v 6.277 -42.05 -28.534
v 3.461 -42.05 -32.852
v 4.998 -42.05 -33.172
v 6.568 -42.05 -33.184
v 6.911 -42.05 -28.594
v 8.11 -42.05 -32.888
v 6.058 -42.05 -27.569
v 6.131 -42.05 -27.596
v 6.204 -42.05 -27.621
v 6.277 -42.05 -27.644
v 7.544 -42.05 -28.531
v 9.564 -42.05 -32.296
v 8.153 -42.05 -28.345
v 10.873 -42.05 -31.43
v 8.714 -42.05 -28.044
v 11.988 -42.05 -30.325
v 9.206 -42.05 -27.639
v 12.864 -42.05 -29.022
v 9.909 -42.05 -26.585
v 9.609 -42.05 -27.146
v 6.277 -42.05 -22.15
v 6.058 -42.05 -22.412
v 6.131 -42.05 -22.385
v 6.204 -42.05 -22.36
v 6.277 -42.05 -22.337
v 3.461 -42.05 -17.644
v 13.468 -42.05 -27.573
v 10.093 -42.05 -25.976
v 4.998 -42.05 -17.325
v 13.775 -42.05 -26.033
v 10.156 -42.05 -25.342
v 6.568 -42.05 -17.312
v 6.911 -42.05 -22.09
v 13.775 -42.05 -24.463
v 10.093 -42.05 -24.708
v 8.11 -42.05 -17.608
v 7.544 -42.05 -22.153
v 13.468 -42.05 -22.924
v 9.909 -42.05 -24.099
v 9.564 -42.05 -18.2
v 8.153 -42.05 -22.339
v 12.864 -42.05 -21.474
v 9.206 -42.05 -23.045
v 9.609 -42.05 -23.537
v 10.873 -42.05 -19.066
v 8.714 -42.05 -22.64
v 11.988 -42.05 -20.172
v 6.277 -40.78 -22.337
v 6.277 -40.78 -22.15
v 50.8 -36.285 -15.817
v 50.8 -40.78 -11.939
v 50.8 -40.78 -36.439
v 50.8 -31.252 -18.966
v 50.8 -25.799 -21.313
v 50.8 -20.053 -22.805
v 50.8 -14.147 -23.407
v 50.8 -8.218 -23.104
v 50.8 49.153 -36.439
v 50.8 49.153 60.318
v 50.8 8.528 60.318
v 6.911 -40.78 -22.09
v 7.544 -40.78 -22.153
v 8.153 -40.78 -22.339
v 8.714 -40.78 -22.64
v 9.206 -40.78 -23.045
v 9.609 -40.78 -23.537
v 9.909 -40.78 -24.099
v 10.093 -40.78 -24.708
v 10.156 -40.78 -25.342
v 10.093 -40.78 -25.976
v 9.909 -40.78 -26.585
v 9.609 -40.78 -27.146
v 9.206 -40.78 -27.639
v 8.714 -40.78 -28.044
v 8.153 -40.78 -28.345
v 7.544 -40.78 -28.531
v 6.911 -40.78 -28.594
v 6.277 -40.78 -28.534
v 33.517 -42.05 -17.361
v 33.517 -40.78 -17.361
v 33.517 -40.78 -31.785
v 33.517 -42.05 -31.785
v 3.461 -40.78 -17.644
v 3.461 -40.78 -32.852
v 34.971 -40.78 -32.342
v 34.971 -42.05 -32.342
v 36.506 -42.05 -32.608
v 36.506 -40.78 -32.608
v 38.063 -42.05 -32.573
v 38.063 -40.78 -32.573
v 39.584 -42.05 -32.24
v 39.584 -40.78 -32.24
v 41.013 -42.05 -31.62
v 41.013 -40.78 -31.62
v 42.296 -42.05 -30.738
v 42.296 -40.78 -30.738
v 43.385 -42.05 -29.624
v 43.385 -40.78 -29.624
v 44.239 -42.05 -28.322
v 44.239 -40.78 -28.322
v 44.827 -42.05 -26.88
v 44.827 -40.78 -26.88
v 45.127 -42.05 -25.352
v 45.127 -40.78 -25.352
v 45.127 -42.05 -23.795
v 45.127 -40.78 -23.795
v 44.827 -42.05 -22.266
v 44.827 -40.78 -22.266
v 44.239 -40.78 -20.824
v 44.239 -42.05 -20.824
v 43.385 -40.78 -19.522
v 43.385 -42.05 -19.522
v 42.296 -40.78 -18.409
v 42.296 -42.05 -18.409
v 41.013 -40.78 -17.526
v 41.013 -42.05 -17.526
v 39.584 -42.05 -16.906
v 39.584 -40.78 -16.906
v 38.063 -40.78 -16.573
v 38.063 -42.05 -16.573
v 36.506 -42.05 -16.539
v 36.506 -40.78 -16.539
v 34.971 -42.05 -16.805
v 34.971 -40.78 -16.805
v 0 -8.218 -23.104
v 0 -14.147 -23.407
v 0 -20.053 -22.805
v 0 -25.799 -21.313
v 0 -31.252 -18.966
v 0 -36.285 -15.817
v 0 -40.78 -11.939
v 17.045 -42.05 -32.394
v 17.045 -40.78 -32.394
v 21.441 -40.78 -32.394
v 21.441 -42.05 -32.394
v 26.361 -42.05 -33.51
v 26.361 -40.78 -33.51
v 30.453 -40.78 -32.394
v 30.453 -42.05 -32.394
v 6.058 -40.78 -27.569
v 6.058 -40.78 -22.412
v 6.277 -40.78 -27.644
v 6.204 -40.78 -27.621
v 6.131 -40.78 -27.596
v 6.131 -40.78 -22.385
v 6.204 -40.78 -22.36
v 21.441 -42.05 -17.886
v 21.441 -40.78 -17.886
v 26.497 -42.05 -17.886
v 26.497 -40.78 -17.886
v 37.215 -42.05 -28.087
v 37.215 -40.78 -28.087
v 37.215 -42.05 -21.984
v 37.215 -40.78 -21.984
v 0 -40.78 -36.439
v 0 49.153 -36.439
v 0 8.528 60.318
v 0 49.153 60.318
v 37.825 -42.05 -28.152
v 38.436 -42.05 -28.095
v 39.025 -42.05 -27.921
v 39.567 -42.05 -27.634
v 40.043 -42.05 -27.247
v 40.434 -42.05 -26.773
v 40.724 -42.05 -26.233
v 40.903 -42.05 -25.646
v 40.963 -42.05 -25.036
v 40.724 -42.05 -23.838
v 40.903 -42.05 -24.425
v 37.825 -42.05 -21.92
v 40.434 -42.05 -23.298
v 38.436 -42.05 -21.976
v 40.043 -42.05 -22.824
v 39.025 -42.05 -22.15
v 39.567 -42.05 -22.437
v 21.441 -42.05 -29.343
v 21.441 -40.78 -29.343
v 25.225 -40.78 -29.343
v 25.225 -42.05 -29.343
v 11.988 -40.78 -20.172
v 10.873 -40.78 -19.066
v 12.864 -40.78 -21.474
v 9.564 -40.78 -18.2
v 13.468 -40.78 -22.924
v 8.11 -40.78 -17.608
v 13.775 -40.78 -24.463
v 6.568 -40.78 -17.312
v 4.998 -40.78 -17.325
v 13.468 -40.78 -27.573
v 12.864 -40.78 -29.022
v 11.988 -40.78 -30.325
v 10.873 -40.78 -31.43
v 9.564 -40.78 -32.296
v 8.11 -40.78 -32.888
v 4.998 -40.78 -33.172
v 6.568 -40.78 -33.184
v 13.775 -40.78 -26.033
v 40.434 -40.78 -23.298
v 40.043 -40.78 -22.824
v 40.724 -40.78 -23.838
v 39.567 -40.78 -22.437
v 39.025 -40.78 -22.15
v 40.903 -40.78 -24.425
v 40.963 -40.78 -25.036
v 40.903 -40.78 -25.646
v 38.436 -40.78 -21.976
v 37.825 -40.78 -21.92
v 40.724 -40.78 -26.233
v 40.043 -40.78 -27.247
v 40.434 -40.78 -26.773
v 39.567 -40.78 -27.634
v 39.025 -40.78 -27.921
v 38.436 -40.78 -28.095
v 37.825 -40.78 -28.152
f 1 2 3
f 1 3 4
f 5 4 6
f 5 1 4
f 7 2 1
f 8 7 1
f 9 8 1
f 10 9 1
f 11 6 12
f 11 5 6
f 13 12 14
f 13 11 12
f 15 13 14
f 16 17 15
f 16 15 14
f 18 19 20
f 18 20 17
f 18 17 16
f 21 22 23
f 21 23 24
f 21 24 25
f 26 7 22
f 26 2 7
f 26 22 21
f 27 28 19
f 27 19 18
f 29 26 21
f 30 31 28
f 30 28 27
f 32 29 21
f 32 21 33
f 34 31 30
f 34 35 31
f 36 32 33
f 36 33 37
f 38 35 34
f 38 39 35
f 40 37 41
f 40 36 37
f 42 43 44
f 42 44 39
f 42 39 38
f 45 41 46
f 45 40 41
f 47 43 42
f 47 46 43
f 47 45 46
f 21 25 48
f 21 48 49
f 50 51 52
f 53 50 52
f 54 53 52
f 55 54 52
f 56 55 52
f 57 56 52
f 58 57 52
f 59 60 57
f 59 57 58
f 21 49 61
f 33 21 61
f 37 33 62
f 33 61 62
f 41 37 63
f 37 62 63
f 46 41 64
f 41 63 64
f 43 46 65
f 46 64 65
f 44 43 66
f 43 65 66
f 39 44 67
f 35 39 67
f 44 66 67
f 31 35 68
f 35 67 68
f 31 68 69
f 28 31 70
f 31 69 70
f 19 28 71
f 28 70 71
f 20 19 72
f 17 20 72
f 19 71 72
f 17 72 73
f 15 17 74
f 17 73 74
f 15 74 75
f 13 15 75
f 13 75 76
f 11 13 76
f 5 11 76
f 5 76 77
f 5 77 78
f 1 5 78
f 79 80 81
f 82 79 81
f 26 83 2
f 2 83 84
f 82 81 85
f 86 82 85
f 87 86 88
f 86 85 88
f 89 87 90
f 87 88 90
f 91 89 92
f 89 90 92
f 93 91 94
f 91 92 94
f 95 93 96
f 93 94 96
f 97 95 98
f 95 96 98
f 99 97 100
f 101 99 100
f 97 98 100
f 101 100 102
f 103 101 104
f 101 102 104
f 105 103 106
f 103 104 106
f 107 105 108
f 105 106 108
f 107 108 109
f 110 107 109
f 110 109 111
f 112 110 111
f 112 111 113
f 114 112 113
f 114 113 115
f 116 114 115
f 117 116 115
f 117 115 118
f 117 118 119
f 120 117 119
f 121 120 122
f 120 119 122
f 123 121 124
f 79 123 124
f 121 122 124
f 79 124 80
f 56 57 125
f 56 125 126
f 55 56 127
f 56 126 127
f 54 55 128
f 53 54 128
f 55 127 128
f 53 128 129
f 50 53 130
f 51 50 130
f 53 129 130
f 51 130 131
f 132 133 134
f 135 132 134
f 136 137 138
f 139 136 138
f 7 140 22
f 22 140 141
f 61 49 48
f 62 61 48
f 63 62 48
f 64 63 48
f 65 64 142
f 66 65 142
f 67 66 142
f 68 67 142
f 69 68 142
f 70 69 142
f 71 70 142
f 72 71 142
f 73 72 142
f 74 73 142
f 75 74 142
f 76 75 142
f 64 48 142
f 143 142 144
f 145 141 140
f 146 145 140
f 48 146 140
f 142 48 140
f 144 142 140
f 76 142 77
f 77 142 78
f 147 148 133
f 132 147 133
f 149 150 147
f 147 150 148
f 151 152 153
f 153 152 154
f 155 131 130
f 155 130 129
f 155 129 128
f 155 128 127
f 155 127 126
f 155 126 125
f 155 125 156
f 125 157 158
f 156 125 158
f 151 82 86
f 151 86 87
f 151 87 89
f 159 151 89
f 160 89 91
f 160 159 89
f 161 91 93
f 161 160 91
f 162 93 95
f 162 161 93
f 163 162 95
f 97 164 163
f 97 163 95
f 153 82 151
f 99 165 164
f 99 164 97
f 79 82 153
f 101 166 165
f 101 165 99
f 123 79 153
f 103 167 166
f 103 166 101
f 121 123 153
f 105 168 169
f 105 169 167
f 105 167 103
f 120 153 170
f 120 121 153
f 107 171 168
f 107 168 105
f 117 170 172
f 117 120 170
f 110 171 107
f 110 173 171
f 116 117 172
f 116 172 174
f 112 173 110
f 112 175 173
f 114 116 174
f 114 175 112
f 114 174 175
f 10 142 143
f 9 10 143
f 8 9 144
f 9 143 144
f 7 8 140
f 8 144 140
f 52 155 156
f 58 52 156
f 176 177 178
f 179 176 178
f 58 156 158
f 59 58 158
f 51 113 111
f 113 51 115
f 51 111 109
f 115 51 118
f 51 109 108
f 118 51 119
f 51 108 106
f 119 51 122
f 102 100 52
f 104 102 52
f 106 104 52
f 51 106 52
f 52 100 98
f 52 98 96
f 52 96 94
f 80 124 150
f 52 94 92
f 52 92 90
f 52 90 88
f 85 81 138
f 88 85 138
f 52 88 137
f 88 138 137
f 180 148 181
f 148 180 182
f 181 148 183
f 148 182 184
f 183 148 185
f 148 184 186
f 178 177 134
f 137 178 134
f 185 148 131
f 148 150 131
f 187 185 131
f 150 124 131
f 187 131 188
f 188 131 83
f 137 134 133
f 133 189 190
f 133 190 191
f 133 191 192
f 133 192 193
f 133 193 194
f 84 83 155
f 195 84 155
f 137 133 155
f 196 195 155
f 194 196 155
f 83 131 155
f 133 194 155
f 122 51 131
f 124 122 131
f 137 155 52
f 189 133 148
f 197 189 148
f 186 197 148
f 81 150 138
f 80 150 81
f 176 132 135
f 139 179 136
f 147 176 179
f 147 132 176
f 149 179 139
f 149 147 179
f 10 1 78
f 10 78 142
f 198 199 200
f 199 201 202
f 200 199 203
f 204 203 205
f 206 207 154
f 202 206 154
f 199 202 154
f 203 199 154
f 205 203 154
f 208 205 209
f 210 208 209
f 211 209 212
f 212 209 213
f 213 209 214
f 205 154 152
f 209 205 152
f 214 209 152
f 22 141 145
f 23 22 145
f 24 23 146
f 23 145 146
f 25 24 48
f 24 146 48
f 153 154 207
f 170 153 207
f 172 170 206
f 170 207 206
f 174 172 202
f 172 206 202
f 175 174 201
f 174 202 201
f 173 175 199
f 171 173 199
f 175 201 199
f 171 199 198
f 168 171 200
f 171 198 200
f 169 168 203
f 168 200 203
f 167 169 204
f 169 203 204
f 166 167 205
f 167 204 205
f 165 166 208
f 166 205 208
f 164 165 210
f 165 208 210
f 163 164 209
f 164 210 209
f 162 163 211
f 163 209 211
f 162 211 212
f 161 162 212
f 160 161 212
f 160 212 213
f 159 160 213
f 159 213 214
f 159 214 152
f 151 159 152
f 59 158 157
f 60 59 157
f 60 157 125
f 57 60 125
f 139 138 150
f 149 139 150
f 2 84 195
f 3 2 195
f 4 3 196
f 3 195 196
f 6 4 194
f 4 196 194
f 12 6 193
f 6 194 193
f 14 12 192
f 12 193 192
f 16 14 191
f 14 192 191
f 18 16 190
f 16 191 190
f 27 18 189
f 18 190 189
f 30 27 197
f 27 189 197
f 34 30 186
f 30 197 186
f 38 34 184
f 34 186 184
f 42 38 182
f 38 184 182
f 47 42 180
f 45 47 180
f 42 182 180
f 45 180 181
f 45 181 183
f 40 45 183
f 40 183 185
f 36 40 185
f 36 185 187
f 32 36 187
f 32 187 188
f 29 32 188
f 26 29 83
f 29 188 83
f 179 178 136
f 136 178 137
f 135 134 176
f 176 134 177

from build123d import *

# Parameters (mm, degrees)
F1_DEPTH = 50.8
F5_DEPTH = 1.27
F6_DEPTH = 1.27
F9_DEPTH = 1.27


with BuildPart() as f1:
    # F0 (on Right) → F1 (new body)
    with BuildSketch(Plane.YZ):
        with BuildLine():
            Line((8.528198, 60.317617), (-8.218083, -23.103662))
            ThreePointArc((-8.218083, -23.103662), (-25.79917, -21.313188), (-40.780291, -11.939476))
            Line((-40.780291, -11.939476), (-40.780291, -36.438663))
            Line((-40.780291, -36.438663), (49.153432, -36.438663))
            Line((49.153432, -36.438663), (49.153432, 60.317617))
            Line((49.153432, 60.317617), (8.528198, 60.317617))
        make_face()
    extrude(amount=F1_DEPTH)

    # F4 (on face) → F5 (join)
    with BuildSketch(Plane.XZ.offset(40.780291)):
        with BuildLine():
            ThreePointArc((33.516739, -31.78544), (45.164839, -24.573186), (33.516739, -17.360933))
            Line((33.516739, -17.360933), (33.516739, -31.78544))
        make_face()
        with BuildLine():
            Line((37.21533, -28.086847), (37.21533, -21.984173))
            ThreePointArc((37.21533, -21.984173), (40.963246, -25.03551), (37.21533, -28.086847))
        make_face(mode=Mode.SUBTRACT)
    extrude(amount=F5_DEPTH)

    # F3 (on face) → F6 (join)
    with BuildSketch(Plane.XZ.offset(40.780291)):
        Polygon((21.440968, -17.885948), (17.044695, -32.393657), (21.440968, -32.393657), (21.440968, -29.343316), (25.225146, -29.343316), (26.361415, -33.509634), (30.453332, -32.393657), (26.496684, -17.885948), align=None)
    extrude(amount=F6_DEPTH)

    # F8 (on face) → F9 (join)
    with BuildSketch(Plane.XZ.offset(40.780291)):
        with BuildLine():
            ThreePointArc((3.46116, -32.851707), (13.814214, -25.248081), (3.46116, -17.644456))
            Line((3.46116, -17.644456), (3.46116, -32.851707))
        make_face()
        with BuildLine():
            Line((6.277318, -22.336844), (6.277318, -22.15031))
            ThreePointArc((6.277318, -22.15031), (10.155551, -25.341956), (6.277318, -28.533602))
            Line((6.277318, -28.533602), (6.277318, -27.643853))
            ThreePointArc((6.277318, -27.643853), (6.166951, -27.608621), (6.058155, -27.5688))
            Line((6.058155, -27.5688), (6.058155, -22.411896))
            ThreePointArc((6.058155, -22.411896), (6.166951, -22.372076), (6.277318, -22.336844))
        make_face(mode=Mode.SUBTRACT)
    extrude(amount=F9_DEPTH)


solid = f1.part
